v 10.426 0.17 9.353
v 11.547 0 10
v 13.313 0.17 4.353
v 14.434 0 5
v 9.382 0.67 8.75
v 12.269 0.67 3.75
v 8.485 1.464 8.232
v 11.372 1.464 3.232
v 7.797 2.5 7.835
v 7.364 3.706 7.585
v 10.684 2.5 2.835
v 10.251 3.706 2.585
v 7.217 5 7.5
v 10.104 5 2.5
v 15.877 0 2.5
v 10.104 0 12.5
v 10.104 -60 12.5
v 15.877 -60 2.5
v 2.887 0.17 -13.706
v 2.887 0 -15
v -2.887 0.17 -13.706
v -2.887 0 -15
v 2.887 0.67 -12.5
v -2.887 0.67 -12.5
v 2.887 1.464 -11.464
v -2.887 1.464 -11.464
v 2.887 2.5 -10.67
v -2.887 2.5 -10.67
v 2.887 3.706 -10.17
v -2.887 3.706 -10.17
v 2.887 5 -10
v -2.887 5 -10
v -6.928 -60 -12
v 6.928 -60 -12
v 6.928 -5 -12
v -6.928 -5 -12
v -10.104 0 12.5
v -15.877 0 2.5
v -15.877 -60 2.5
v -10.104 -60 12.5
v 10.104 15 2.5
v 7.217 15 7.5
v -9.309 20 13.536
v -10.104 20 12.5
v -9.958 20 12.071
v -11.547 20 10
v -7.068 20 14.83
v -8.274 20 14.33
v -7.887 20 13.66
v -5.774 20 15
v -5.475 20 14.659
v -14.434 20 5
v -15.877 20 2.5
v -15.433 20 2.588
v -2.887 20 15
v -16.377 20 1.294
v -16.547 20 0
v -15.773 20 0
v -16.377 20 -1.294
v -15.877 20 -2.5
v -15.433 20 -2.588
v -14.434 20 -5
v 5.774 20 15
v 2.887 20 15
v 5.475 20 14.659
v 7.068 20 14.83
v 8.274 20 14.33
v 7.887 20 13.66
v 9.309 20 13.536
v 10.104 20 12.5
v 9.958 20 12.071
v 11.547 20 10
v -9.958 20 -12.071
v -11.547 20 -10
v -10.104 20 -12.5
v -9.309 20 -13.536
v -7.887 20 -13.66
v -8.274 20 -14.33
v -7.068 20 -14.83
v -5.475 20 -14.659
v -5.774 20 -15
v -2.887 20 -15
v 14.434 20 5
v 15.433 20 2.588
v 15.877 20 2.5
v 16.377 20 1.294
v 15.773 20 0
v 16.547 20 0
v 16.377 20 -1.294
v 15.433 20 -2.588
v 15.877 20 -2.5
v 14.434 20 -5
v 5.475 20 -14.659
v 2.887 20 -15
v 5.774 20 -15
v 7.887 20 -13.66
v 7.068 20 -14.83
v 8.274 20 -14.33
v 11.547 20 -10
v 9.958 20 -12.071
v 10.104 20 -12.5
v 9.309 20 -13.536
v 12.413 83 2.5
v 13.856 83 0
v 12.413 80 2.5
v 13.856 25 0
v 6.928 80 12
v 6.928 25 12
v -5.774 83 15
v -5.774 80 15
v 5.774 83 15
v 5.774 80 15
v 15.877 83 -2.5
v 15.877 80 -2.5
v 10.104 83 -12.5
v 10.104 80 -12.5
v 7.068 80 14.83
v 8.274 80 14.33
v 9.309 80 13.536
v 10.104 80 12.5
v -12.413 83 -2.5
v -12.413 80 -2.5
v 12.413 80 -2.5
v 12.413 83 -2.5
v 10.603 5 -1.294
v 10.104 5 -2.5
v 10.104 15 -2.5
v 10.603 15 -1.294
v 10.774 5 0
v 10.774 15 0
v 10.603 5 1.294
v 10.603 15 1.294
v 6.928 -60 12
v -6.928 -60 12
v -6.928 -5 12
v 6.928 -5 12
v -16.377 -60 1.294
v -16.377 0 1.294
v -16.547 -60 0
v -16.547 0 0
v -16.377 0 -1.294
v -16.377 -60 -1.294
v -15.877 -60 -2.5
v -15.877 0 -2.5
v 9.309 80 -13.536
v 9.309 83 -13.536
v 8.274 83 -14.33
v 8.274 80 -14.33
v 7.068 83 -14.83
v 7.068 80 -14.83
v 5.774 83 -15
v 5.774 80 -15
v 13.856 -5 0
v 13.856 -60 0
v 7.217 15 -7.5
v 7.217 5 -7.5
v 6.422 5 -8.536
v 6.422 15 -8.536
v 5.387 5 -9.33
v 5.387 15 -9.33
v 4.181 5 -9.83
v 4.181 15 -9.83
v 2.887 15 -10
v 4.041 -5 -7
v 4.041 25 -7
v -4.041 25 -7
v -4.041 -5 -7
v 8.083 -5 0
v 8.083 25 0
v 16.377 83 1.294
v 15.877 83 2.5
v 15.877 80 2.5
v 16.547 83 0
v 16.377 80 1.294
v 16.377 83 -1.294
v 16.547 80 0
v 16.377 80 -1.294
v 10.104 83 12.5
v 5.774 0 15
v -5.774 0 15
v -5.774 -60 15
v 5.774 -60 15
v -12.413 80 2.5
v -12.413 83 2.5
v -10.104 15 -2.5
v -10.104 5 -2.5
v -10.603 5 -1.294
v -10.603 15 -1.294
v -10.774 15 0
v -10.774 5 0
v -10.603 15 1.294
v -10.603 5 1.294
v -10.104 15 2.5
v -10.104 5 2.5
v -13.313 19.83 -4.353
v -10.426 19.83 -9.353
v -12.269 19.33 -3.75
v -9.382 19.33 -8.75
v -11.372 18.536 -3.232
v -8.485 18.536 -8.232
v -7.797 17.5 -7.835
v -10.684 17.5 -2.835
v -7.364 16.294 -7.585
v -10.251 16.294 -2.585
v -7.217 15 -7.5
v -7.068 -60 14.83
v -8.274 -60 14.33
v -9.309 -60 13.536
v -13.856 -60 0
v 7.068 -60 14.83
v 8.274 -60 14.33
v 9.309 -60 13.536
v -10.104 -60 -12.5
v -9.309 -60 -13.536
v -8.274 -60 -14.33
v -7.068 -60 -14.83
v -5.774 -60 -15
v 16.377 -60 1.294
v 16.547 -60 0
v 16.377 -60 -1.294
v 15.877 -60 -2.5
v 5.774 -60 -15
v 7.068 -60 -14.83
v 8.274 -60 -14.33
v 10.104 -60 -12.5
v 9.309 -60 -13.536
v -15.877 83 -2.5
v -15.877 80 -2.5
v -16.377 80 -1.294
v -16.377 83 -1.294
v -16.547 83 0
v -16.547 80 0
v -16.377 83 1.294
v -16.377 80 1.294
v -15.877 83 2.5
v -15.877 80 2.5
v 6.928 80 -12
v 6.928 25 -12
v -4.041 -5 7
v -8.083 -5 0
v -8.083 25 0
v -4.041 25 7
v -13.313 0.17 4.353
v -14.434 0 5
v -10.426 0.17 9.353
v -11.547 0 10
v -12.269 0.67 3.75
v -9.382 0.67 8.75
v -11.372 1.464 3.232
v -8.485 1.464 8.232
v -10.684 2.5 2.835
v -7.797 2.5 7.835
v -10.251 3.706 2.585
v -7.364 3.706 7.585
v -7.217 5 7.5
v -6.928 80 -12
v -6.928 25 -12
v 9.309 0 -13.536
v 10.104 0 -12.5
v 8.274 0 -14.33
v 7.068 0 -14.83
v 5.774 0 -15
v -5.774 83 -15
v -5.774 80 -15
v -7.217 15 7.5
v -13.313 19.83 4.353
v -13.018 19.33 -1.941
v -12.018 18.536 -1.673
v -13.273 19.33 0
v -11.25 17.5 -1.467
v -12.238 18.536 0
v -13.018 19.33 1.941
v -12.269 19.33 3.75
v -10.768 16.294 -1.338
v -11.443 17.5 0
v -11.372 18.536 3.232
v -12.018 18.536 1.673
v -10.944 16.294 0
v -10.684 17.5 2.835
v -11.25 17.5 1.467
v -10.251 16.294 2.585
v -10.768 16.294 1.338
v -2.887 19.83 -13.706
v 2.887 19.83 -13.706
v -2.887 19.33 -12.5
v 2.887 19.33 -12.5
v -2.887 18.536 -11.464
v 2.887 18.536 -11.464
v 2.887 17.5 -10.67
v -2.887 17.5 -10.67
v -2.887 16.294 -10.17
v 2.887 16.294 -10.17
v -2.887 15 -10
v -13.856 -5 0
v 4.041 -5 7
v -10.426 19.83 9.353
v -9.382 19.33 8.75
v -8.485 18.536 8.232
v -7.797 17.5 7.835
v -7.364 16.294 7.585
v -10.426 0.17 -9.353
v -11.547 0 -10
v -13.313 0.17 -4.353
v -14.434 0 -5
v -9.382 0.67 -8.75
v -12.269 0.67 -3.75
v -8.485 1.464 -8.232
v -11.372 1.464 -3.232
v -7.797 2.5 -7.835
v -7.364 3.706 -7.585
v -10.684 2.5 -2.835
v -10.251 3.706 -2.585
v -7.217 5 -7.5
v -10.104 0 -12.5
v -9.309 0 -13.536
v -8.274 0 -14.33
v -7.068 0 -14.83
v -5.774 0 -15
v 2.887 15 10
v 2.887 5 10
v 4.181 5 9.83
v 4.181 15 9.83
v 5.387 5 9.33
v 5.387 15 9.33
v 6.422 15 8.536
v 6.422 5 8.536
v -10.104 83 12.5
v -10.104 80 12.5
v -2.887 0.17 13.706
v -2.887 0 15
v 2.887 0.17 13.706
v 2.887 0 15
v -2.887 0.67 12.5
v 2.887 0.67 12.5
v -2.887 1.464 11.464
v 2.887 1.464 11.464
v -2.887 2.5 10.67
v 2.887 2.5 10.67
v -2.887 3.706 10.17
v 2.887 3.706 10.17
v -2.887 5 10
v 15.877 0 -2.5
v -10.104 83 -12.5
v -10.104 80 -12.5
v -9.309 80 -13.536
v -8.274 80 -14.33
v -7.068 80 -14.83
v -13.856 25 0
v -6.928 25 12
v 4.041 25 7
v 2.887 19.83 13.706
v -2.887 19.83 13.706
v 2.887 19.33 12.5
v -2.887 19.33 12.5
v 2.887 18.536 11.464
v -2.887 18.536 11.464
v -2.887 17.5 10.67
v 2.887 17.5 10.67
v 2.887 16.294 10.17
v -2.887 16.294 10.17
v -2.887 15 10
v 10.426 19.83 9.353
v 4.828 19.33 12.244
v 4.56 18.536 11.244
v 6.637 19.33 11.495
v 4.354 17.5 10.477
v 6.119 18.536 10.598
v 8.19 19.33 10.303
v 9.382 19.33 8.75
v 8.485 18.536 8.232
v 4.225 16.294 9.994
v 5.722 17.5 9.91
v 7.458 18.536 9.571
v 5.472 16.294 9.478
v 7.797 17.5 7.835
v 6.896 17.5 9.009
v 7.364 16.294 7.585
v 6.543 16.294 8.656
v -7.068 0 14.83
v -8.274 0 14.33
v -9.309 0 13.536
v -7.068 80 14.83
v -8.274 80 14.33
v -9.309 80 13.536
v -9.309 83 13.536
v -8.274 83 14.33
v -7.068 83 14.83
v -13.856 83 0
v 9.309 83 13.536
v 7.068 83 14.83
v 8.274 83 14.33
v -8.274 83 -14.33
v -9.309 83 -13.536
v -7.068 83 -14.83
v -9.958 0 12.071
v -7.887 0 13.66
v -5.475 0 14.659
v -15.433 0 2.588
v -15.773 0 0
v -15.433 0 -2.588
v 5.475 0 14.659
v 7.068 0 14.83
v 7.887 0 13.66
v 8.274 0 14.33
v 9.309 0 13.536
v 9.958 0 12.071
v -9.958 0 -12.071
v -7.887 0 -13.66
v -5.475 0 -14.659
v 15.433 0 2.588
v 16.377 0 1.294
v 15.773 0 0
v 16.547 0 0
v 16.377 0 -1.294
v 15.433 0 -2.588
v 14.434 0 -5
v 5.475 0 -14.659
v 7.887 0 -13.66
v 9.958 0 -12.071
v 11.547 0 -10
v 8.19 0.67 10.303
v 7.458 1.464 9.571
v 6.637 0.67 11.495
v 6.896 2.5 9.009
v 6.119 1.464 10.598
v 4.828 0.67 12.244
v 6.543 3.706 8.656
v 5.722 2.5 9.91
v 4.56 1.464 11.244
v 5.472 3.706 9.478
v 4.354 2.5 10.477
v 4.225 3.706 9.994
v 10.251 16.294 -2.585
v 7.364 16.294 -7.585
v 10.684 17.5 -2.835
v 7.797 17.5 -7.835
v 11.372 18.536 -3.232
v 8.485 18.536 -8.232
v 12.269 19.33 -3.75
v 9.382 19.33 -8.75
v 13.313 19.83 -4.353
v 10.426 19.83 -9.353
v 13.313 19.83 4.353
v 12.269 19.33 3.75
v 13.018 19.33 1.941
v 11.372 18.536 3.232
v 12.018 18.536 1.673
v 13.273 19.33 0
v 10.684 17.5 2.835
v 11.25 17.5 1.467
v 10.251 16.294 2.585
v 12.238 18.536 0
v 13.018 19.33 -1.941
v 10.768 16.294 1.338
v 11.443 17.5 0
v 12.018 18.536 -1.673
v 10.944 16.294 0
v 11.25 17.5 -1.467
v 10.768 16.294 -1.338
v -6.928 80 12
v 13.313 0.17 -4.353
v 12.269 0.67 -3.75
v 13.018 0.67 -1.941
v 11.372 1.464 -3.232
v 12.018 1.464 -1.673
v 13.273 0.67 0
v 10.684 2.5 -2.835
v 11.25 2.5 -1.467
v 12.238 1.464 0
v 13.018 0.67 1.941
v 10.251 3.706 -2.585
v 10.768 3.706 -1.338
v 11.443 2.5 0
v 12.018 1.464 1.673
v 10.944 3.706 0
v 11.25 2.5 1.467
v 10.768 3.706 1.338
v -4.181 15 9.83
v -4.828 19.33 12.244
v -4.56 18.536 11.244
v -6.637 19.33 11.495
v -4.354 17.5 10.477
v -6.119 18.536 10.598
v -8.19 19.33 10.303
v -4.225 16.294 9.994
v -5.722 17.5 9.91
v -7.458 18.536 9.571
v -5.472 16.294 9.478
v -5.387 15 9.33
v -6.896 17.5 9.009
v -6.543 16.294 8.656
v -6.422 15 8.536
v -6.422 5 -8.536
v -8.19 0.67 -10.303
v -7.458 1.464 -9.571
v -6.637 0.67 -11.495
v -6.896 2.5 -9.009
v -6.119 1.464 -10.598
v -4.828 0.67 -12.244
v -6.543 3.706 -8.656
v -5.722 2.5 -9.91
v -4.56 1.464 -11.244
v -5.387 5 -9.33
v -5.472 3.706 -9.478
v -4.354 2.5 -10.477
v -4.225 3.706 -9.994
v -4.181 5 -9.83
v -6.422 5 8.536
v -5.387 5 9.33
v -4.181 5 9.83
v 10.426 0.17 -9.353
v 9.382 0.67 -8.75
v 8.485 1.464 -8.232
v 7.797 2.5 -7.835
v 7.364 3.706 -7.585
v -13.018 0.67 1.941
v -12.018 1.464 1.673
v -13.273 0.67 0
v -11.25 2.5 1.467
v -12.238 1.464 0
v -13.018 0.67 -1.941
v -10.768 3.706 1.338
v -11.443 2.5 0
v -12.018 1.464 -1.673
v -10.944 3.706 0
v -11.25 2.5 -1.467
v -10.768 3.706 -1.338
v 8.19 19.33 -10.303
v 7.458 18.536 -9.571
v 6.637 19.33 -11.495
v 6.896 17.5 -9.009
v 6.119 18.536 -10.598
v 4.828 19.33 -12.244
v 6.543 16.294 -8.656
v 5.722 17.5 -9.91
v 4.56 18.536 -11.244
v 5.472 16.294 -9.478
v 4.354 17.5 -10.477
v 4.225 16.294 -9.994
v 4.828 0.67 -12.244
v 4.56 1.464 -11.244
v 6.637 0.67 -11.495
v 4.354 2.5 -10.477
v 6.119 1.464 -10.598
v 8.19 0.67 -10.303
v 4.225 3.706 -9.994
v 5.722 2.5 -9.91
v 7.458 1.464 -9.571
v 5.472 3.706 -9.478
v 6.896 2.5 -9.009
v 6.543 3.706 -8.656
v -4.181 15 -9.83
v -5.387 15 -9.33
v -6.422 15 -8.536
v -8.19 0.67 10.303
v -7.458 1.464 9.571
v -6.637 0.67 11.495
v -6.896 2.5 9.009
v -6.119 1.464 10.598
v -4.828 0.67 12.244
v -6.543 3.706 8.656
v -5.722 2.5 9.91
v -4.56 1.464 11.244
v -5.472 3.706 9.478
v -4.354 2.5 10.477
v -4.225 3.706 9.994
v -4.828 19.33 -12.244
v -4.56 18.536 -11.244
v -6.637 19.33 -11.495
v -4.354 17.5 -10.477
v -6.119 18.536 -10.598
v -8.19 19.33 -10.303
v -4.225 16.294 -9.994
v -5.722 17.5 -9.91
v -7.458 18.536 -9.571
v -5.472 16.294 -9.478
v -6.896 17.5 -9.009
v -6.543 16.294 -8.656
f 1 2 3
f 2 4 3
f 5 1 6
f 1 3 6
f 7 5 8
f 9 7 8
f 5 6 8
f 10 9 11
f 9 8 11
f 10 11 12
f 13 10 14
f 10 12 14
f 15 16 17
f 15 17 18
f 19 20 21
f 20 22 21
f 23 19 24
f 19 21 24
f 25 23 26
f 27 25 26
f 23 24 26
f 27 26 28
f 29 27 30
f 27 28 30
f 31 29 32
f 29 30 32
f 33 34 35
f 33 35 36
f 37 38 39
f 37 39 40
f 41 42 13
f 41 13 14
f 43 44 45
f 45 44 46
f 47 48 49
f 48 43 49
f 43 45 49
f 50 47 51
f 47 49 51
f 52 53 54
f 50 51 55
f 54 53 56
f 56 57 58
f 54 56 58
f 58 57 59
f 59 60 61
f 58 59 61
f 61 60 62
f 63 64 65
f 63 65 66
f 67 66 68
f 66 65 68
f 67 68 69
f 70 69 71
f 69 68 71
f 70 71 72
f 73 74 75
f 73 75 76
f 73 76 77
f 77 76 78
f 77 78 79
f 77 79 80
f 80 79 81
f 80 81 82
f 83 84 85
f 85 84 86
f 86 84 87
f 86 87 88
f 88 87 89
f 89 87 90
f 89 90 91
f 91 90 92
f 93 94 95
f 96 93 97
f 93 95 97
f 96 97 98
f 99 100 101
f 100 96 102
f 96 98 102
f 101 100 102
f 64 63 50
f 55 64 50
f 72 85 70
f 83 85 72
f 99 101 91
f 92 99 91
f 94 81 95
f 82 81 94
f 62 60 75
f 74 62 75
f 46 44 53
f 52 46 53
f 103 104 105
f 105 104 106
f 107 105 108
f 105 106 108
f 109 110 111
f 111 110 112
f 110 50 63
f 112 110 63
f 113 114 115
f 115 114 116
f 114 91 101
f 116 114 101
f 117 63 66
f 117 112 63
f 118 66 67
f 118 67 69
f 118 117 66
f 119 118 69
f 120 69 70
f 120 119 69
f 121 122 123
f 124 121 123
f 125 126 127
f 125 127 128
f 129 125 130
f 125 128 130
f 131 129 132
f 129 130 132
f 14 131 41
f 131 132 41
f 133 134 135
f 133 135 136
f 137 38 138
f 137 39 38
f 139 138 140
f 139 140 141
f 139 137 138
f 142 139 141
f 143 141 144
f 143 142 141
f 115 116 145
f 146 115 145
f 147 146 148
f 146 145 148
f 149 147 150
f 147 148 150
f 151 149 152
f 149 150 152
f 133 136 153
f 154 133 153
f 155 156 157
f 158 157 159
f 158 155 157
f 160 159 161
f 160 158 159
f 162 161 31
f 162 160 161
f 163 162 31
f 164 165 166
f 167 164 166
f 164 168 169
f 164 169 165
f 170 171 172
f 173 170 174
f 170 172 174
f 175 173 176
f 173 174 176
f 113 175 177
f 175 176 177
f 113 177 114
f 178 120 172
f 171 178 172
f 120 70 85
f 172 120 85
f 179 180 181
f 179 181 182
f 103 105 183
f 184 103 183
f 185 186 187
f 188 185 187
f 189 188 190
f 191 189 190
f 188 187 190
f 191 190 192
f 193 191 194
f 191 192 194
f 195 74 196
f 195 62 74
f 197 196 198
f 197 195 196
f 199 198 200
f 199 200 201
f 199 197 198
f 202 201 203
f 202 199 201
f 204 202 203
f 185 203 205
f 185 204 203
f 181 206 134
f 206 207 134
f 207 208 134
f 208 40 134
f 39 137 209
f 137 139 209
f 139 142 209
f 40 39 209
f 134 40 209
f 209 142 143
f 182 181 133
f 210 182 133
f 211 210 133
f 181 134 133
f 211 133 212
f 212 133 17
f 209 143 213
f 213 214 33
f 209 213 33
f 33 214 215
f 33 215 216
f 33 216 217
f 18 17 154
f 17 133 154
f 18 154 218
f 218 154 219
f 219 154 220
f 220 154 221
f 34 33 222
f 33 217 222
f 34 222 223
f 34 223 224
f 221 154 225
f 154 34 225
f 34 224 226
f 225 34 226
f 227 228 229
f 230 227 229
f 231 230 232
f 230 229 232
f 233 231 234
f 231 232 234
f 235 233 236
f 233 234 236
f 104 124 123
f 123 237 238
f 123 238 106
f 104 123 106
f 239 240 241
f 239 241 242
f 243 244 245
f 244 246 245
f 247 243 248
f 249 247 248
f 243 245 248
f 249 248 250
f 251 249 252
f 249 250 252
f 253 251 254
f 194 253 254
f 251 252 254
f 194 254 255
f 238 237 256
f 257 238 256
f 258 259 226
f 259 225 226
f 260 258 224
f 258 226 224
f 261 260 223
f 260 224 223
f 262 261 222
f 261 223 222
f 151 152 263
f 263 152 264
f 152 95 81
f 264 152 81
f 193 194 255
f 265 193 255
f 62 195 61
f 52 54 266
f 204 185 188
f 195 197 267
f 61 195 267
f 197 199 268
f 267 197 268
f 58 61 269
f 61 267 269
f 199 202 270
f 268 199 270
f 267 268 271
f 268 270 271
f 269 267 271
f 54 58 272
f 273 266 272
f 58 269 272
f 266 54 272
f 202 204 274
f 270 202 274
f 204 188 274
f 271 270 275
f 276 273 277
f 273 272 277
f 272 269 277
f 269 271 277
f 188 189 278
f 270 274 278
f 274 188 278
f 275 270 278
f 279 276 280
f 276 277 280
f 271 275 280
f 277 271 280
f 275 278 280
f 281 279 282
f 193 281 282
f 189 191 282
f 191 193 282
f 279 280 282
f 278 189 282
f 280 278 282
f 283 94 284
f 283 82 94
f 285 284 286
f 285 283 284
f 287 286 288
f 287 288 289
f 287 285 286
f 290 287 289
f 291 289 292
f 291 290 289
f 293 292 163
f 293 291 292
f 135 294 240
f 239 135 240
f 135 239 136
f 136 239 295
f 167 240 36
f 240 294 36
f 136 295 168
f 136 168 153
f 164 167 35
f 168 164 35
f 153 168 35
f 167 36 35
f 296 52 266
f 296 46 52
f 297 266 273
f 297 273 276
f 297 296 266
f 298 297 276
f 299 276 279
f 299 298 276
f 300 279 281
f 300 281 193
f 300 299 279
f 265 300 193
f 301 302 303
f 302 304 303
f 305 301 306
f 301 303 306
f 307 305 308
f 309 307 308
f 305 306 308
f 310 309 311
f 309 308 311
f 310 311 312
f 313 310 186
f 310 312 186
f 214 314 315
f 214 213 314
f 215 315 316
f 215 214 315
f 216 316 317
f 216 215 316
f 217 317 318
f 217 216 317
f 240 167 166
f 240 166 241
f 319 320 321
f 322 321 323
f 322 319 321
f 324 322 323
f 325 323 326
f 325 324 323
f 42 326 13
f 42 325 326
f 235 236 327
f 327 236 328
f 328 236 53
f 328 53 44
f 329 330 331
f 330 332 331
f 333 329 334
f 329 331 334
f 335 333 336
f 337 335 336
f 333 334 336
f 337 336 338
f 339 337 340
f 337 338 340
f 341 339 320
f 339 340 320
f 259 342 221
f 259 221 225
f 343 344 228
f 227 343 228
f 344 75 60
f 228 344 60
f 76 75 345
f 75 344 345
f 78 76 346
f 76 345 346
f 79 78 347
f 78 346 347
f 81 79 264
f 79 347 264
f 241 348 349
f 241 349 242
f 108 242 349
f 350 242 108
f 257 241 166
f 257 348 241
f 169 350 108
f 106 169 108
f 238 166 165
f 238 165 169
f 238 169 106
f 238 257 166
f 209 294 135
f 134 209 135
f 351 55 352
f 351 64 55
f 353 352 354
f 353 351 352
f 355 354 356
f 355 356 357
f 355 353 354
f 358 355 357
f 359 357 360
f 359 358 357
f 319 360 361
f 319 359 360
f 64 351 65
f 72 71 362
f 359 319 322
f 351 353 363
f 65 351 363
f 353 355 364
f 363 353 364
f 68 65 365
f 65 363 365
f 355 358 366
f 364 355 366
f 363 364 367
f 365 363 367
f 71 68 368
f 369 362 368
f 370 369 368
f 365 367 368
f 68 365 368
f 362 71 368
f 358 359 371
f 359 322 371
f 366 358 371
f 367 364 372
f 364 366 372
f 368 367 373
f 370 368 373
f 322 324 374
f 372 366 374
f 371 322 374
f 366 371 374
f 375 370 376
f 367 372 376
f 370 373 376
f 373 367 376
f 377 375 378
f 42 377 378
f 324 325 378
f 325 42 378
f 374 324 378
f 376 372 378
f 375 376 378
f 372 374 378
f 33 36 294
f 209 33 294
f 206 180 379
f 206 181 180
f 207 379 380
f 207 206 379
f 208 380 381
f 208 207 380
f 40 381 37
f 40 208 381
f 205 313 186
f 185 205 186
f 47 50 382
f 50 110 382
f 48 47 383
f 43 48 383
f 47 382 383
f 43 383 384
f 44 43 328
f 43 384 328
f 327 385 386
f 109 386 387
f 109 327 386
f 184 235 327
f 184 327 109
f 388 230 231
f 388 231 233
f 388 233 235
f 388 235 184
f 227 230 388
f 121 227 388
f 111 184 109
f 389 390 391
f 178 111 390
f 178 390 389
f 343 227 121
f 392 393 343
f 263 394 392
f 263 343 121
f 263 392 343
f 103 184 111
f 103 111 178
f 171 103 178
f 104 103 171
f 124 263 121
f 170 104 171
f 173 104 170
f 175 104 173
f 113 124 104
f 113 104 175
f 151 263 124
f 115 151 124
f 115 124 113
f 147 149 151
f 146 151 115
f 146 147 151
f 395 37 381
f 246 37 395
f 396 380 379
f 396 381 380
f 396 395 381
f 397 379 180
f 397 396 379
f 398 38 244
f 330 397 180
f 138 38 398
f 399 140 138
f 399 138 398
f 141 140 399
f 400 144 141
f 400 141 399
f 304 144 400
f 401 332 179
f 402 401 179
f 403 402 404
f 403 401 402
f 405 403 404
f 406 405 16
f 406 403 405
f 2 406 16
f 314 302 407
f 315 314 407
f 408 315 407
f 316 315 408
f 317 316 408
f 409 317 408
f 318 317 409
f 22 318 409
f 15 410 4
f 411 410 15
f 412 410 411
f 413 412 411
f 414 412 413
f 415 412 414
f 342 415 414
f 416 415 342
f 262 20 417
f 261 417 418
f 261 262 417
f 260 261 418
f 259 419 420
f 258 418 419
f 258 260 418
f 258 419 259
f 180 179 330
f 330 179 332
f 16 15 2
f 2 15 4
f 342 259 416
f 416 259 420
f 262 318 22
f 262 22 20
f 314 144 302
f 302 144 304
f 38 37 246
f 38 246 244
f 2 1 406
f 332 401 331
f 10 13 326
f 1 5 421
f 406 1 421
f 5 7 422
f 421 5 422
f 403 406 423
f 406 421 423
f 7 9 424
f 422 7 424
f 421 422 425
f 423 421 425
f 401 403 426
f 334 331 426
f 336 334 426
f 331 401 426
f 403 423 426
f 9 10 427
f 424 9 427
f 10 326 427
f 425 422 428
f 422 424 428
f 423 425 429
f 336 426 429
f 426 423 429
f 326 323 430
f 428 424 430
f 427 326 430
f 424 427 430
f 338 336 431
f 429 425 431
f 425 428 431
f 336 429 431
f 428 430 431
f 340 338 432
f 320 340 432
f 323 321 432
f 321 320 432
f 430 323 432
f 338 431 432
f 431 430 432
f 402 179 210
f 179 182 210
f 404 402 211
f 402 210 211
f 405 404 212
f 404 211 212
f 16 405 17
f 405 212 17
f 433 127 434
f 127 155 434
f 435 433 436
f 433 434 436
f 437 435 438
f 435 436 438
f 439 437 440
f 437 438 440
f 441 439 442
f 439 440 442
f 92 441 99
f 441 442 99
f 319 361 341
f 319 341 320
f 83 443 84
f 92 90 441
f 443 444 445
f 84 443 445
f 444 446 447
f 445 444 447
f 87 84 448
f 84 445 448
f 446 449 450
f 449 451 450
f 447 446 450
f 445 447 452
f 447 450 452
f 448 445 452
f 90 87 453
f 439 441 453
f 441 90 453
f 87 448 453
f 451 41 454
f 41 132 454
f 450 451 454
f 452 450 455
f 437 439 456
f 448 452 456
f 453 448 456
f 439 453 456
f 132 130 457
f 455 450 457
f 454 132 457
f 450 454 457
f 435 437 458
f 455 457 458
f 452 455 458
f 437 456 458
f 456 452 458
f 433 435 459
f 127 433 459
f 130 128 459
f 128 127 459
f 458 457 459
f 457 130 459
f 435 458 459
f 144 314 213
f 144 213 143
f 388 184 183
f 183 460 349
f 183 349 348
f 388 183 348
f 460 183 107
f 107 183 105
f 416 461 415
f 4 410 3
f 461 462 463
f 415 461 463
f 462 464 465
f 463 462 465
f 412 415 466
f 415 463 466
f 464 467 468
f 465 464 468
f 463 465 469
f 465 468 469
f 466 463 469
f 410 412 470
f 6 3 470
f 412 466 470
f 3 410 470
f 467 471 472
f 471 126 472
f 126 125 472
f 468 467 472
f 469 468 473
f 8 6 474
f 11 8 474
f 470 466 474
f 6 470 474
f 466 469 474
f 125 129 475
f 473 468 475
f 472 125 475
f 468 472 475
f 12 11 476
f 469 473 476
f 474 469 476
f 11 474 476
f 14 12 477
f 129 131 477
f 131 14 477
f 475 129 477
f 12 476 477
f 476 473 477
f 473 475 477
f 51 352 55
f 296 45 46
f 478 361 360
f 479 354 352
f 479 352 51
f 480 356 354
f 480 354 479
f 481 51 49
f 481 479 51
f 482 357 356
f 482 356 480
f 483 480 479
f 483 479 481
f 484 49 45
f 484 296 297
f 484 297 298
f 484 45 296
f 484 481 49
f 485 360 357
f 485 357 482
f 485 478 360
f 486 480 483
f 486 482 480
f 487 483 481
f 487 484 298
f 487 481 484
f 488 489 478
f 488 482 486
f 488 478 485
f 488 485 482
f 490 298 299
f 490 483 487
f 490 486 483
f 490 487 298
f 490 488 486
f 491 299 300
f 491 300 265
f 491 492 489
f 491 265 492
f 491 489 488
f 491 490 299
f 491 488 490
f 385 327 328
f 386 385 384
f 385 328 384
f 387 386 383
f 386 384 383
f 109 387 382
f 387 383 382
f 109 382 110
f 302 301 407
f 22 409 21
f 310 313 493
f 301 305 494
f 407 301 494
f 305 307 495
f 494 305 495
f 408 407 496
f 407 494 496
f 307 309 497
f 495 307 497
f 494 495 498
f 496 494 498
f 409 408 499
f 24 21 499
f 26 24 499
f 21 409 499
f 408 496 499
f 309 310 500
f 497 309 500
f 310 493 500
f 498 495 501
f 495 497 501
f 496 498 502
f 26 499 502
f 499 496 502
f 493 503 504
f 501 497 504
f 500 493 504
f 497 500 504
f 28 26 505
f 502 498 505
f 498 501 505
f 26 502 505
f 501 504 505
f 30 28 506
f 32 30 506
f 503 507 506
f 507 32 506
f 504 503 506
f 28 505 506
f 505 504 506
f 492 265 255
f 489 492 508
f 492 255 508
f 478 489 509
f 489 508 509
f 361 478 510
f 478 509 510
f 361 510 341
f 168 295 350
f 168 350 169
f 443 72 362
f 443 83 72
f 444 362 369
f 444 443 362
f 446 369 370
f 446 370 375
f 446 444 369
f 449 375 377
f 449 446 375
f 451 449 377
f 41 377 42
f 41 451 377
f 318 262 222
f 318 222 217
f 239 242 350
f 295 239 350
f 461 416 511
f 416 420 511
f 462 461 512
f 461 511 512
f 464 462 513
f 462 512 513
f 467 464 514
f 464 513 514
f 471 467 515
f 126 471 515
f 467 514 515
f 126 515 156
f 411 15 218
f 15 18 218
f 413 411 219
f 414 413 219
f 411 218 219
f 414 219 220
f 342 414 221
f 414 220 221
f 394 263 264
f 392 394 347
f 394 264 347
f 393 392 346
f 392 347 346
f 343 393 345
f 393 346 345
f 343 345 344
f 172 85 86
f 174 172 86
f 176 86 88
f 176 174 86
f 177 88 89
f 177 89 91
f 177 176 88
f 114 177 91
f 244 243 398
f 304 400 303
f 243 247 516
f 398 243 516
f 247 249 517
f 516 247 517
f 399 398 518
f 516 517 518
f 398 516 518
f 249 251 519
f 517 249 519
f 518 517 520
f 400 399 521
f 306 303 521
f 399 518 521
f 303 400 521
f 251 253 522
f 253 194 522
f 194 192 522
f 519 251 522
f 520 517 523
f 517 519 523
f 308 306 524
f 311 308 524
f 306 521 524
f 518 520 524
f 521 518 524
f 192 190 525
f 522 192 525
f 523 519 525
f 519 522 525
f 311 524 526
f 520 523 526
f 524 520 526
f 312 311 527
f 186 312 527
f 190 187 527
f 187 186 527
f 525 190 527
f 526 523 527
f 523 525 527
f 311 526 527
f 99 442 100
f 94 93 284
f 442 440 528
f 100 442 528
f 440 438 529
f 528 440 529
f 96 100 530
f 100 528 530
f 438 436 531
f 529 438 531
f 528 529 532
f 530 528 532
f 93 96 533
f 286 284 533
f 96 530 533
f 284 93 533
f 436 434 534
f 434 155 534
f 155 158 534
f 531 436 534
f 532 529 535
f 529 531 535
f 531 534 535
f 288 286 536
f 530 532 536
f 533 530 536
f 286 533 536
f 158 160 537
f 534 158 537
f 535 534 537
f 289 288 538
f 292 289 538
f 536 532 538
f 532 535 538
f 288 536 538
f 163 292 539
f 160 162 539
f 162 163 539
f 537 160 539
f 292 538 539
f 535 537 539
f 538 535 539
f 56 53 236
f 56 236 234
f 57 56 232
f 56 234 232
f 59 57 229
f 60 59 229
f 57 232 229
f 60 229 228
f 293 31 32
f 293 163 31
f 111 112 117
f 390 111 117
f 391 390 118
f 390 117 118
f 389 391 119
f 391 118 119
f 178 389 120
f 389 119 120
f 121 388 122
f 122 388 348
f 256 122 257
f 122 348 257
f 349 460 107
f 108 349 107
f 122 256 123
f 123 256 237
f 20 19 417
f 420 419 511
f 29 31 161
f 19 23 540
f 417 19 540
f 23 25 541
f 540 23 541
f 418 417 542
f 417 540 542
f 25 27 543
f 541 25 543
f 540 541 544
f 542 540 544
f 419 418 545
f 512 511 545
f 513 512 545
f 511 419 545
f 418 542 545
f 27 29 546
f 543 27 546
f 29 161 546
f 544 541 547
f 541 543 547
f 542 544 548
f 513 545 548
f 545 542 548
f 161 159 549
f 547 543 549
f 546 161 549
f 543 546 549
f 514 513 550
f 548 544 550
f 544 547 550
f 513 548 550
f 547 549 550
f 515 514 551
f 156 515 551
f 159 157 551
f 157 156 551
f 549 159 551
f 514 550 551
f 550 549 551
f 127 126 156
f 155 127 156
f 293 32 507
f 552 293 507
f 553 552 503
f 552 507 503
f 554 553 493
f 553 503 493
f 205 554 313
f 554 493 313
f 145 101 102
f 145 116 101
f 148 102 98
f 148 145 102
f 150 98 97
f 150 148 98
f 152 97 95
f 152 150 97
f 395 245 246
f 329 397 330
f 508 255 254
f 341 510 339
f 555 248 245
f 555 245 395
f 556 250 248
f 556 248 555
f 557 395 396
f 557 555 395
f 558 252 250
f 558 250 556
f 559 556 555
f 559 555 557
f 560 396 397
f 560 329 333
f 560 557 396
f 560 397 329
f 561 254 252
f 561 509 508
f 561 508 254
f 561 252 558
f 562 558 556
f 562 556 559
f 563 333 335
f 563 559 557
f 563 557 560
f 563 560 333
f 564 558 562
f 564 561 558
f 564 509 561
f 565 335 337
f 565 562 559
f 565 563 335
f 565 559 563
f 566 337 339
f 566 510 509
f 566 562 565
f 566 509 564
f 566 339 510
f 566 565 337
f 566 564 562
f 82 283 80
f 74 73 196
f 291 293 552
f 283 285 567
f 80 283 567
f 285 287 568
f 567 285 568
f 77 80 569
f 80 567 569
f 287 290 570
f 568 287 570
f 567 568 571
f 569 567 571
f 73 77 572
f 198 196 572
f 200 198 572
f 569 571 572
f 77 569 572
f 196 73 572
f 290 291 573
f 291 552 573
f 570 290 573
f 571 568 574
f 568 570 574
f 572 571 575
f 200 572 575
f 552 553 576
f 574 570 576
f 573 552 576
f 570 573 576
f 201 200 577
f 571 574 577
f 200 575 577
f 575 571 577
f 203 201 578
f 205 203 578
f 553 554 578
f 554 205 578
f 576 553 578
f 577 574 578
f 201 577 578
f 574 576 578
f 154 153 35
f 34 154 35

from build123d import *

# Parameters (mm, degrees)
BOSS_EXTRUDE1_DEPTH  = 10
BOSS_EXTRUDE2_DEPTH  = 5
BOSS_EXTRUDE3_DEPTH  = 60
FILLET1_R            = 5
FILLET1_OF_MIRROR1_R = 5
BOSS_EXTRUDE4_DEPTH  = 3
FILLET2_R            = 5


with BuildPart() as part:
    # Sketch1 → Boss-Extrude1 (new body)
    with BuildSketch(Plane(origin=(0, 0, 0), x_dir=(1, 0, 0), z_dir=(0, 1, 0))):
        Polygon((-5.773502692, -10), (5.773502692, -10), (11.547005384, 0), (5.773502692, 10), (-5.773502692, 10), (-11.547005384, 0), align=None)
        Polygon((-4.041451884, -7), (4.041451884, -7), (8.082903769, 0), (4.041451884, 7), (-4.041451884, 7), (-8.082903769, 0), align=None, mode=Mode.SUBTRACT)
    boss_extrude1 = extrude(amount=BOSS_EXTRUDE1_DEPTH)

    # Sketch1<3> → Boss-Extrude2 (add)
    # profile 1 of 2: a face of its own
    with BuildSketch(Plane(origin=(0, 0, 0), x_dir=(1, 0, 0), z_dir=(0, 1, 0))):
        Polygon((-6.92820323, -12), (6.92820323, -12), (13.856406461, 0), (6.92820323, 12), (-6.92820323, 12), (-13.856406461, 0), align=None)
        Polygon((5.773502692, -10), (11.547005384, 0), (5.773502692, 10), (-5.773502692, 10), (-11.547005384, 0), (-5.773502692, -10), align=None, mode=Mode.SUBTRACT)
    # profile 2 of 2: a face of its own
    with BuildSketch(Plane(origin=(0, 0, 0), x_dir=(1, 0, 0), z_dir=(0, 1, 0))):
        Polygon((-5.773502692, -10), (5.773502692, -10), (11.547005384, 0), (5.773502692, 10), (-5.773502692, 10), (-11.547005384, 0), align=None)
        Polygon((-4.041451884, -7), (4.041451884, -7), (8.082903769, 0), (4.041451884, 7), (-4.041451884, 7), (-8.082903769, 0), align=None, mode=Mode.SUBTRACT)
    boss_extrude2 = extrude(amount=-BOSS_EXTRUDE2_DEPTH)

    # Sketch1<4> → Boss-Extrude3 (add)
    with BuildSketch(Plane(origin=(0, 0, 0), x_dir=(1, 0, 0), z_dir=(0, 1, 0))):
        Polygon((-8.660254038, -15), (8.660254038, -15), (17.320508076, 0), (8.660254038, 15), (-8.660254038, 15), (-17.320508076, 0), align=None)
        Polygon((6.92820323, -12), (13.856406461, 0), (6.92820323, 12), (-6.92820323, 12), (-13.856406461, 0), (-6.92820323, -12), align=None, mode=Mode.SUBTRACT)
    boss_extrude3 = extrude(amount=-BOSS_EXTRUDE3_DEPTH)

    # Fillet1
    fillet1_edges = [part.edges().sort_by_distance(p)[0] for p in [
        (8.660254038, -30, 15),
        (-8.660254038, -30, 15),
        (-17.320508076, -30, 0),
        (-8.660254038, -30, -15),
        (8.660254038, -30, -15),
        (17.320508076, -30, 0),
    ]]
    fillet(fillet1_edges, radius=FILLET1_R)

    # Mirror1: Boss-Extrude1, Boss-Extrude2, Boss-Extrude3 across plane
    add(boss_extrude1.mirror(Plane.ZX.offset(10)))
    add(boss_extrude2.mirror(Plane.ZX.offset(10)))
    add(boss_extrude3.mirror(Plane.ZX.offset(10)))

    # Fillet1 of Mirror1
    fillet1_of_mirror1_edges = [part.edges().sort_by_distance(p)[0] for p in [
        (8.660254038, 50, 15),
        (-8.660254038, 50, 15),
        (-17.320508076, 50, 0),
        (-8.660254038, 50, -15),
        (8.660254038, 50, -15),
        (17.320508076, 50, 0),
    ]]
    fillet(fillet1_of_mirror1_edges, radius=FILLET1_OF_MIRROR1_R)

    # Sketch2 → Boss-Extrude4 (add)
    # profile 1 of 6: a face of its own
    with BuildSketch(Plane(origin=(0, 80, 0), x_dir=(1, 0, 0), z_dir=(0, 1, 0))):
        with BuildLine():
            ThreePointArc((10.103629711, 12.5), (8.273502692, 14.330127019), (5.773502692, 15))
            Line((5.773502692, 15), (-5.773502692, 15))
            ThreePointArc((-5.773502692, 15), (-8.273502692, 14.330127019), (-10.103629711, 12.5))
            Line((-10.103629711, 12.5), (-15.877132403, 2.5))
            ThreePointArc((-15.877132403, 2.5), (-16.547005384, 0), (-15.877132403, -2.5))
            Line((-15.877132403, -2.5), (-10.103629711, -12.5))
            ThreePointArc((-10.103629711, -12.5), (-8.273502692, -14.330127019), (-5.773502692, -15))
            Line((-5.773502692, -15), (5.773502692, -15))
            ThreePointArc((5.773502692, -15), (8.273502692, -14.330127019), (10.103629711, -12.5))
            Line((10.103629711, -12.5), (15.877132403, -2.5))
            ThreePointArc((15.877132403, -2.5), (16.547005384, 0), (15.877132403, 2.5))
            Line((15.877132403, 2.5), (10.103629711, 12.5))
        make_face()
        Polygon((6.92820323, 12), (13.856406461, 0), (6.92820323, -12), (-6.92820323, -12), (-13.856406461, 0), (-6.92820323, 12), align=None, mode=Mode.SUBTRACT)
    # profile 2 of 6: a face of its own
    with BuildSketch(Plane(origin=(0, 80, 0), x_dir=(1, 0, 0), z_dir=(0, 1, 0))):
        Polygon((-6.92820323, 12), (-12.413030788, 2.5), (12.413030788, 2.5), (6.92820323, 12), align=None)
    # profile 3 of 6: a face of its own
    with BuildSketch(Plane(origin=(0, 80, 0), x_dir=(1, 0, 0), z_dir=(0, 1, 0))):
        Polygon((12.413030788, -2.5), (-12.413030788, -2.5), (-6.92820323, -12), (6.92820323, -12), align=None)
    # profile 4 of 6: a face of its own
    with BuildSketch(Plane(origin=(0, 80, 0), x_dir=(1, 0, 0), z_dir=(0, 1, 0))):
        with BuildLine():
            Line((-12.413030788, -2.5), (-15.877132403, -2.5))
            Line((-15.877132403, -2.5), (-10.103629711, -12.5))
            ThreePointArc((-10.103629711, -12.5), (-8.273502692, -14.330127019), (-5.773502692, -15))
            Line((-5.773502692, -15), (5.773502692, -15))
            ThreePointArc((5.773502692, -15), (8.273502692, -14.330127019), (10.103629711, -12.5))
            Line((10.103629711, -12.5), (15.877132403, -2.5))
            Line((15.877132403, -2.5), (12.413030788, -2.5))
            Line((12.413030788, -2.5), (6.92820323, -12))
            Line((6.92820323, -12), (-6.92820323, -12))
            Line((-6.92820323, -12), (-12.413030788, -2.5))
        make_face()
    # profile 5 of 6: a face of its own
    with BuildSketch(Plane(origin=(0, 80, 0), x_dir=(1, 0, 0), z_dir=(0, 1, 0))):
        with BuildLine():
            Line((15.877132403, 2.5), (12.413030788, 2.5))
            Line((12.413030788, 2.5), (13.856406461, 0))
            Line((13.856406461, 0), (12.413030788, -2.5))
            Line((12.413030788, -2.5), (15.877132403, -2.5))
            ThreePointArc((15.877132403, -2.5), (16.547005384, 0), (15.877132403, 2.5))
        make_face()
    # profile 6 of 6: a face of its own
    with BuildSketch(Plane(origin=(0, 80, 0), x_dir=(1, 0, 0), z_dir=(0, 1, 0))):
        with BuildLine():
            Line((-12.413030788, 2.5), (-15.877132403, 2.5))
            ThreePointArc((-15.877132403, 2.5), (-16.547005384, 0), (-15.877132403, -2.5))
            Line((-15.877132403, -2.5), (-12.413030788, -2.5))
            Line((-12.413030788, -2.5), (-13.856406461, 0))
            Line((-13.856406461, 0), (-12.413030788, 2.5))
        make_face()
    extrude(amount=BOSS_EXTRUDE4_DEPTH)

    # Fillet2
    fillet2_edges = [part.edges().sort_by_distance(p)[0] for p in [
        (-8.660254038, 0, 5),
        (-8.660254038, 0, -5),
        (0, 0, -10),
        (8.660254038, 0, -5),
        (0, 20, 10),
        (8.660254038, 20, 5),
        (8.660254038, 20, -5),
        (0, 20, -10),
        (-8.660254038, 20, -5),
        (-8.660254038, 20, 5),
        (8.660254038, 0, 5),
        (0, 0, 10),
        (-5.773502692, 10, 10),
        (-11.547005384, 10, 0),
        (-5.773502692, 10, -10),
        (5.773502692, 10, -10),
        (11.547005384, 10, 0),
        (5.773502692, 10, 10),
    ]]
    fillet(fillet2_edges, radius=FILLET2_R - 0.0001)  # a hair under: the kernel refuses the full size


solid = part.part
